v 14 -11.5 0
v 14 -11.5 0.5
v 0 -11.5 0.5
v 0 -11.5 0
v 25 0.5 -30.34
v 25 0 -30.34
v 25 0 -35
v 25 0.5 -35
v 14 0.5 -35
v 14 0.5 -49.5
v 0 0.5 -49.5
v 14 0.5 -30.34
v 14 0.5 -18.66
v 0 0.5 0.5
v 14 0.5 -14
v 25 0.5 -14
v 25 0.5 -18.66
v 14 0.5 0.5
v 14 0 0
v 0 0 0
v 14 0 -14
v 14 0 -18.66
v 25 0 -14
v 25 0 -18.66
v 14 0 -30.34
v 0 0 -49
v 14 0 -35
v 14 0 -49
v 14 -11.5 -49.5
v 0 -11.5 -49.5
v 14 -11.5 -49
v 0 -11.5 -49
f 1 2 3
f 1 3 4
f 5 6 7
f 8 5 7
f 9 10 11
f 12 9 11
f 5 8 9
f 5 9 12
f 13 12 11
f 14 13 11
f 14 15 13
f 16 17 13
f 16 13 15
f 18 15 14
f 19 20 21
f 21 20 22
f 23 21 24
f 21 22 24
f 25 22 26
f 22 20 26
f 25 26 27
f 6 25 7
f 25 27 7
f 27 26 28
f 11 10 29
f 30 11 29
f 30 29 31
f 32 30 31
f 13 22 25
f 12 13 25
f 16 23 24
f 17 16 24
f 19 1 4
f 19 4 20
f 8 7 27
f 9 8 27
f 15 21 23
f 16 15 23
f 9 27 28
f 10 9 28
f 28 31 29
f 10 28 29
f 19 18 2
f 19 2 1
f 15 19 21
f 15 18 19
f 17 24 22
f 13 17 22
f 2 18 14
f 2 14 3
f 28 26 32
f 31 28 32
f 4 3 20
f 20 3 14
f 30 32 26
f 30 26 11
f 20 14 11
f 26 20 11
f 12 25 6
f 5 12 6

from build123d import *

# Parameters (mm, degrees)
SALIENTE_EXTRUIR1_DEPTH = 0.5
SALIENTE_EXTRUIR2_DEPTH = 14


with BuildPart() as part:
    # Croquis1 → Saliente-Extruir1 (new body)
    with BuildSketch(Plane(origin=(0, 0, 0), x_dir=(1, 0, 0), z_dir=(0, 1, 0))):
        Polygon((0, 0), (14, 0), (14, 14), (25, 14), (25, 18.66), (14, 18.66), (14, 30.34), (25, 30.34), (25, 35), (14, 35), (14, 49), (0, 49), align=None)
    extrude(amount=SALIENTE_EXTRUIR1_DEPTH)

    # Croquis2 → Saliente-Extruir2 (add, through all)
    with BuildSketch(Plane(origin=(14, 0, 0), x_dir=(0, 0, -1), z_dir=(1, 0, 0))):
        Polygon((0, 0.5), (-0.5, 0.5), (-0.5, -11.5), (0, -11.5), (0, 0), align=None)
        Polygon((49.5, 0.5), (49.5, -11.5), (49, -11.5), (49, 0), (49, 0.5), align=None)
    extrude(amount=-SALIENTE_EXTRUIR2_DEPTH)


solid = part.part
